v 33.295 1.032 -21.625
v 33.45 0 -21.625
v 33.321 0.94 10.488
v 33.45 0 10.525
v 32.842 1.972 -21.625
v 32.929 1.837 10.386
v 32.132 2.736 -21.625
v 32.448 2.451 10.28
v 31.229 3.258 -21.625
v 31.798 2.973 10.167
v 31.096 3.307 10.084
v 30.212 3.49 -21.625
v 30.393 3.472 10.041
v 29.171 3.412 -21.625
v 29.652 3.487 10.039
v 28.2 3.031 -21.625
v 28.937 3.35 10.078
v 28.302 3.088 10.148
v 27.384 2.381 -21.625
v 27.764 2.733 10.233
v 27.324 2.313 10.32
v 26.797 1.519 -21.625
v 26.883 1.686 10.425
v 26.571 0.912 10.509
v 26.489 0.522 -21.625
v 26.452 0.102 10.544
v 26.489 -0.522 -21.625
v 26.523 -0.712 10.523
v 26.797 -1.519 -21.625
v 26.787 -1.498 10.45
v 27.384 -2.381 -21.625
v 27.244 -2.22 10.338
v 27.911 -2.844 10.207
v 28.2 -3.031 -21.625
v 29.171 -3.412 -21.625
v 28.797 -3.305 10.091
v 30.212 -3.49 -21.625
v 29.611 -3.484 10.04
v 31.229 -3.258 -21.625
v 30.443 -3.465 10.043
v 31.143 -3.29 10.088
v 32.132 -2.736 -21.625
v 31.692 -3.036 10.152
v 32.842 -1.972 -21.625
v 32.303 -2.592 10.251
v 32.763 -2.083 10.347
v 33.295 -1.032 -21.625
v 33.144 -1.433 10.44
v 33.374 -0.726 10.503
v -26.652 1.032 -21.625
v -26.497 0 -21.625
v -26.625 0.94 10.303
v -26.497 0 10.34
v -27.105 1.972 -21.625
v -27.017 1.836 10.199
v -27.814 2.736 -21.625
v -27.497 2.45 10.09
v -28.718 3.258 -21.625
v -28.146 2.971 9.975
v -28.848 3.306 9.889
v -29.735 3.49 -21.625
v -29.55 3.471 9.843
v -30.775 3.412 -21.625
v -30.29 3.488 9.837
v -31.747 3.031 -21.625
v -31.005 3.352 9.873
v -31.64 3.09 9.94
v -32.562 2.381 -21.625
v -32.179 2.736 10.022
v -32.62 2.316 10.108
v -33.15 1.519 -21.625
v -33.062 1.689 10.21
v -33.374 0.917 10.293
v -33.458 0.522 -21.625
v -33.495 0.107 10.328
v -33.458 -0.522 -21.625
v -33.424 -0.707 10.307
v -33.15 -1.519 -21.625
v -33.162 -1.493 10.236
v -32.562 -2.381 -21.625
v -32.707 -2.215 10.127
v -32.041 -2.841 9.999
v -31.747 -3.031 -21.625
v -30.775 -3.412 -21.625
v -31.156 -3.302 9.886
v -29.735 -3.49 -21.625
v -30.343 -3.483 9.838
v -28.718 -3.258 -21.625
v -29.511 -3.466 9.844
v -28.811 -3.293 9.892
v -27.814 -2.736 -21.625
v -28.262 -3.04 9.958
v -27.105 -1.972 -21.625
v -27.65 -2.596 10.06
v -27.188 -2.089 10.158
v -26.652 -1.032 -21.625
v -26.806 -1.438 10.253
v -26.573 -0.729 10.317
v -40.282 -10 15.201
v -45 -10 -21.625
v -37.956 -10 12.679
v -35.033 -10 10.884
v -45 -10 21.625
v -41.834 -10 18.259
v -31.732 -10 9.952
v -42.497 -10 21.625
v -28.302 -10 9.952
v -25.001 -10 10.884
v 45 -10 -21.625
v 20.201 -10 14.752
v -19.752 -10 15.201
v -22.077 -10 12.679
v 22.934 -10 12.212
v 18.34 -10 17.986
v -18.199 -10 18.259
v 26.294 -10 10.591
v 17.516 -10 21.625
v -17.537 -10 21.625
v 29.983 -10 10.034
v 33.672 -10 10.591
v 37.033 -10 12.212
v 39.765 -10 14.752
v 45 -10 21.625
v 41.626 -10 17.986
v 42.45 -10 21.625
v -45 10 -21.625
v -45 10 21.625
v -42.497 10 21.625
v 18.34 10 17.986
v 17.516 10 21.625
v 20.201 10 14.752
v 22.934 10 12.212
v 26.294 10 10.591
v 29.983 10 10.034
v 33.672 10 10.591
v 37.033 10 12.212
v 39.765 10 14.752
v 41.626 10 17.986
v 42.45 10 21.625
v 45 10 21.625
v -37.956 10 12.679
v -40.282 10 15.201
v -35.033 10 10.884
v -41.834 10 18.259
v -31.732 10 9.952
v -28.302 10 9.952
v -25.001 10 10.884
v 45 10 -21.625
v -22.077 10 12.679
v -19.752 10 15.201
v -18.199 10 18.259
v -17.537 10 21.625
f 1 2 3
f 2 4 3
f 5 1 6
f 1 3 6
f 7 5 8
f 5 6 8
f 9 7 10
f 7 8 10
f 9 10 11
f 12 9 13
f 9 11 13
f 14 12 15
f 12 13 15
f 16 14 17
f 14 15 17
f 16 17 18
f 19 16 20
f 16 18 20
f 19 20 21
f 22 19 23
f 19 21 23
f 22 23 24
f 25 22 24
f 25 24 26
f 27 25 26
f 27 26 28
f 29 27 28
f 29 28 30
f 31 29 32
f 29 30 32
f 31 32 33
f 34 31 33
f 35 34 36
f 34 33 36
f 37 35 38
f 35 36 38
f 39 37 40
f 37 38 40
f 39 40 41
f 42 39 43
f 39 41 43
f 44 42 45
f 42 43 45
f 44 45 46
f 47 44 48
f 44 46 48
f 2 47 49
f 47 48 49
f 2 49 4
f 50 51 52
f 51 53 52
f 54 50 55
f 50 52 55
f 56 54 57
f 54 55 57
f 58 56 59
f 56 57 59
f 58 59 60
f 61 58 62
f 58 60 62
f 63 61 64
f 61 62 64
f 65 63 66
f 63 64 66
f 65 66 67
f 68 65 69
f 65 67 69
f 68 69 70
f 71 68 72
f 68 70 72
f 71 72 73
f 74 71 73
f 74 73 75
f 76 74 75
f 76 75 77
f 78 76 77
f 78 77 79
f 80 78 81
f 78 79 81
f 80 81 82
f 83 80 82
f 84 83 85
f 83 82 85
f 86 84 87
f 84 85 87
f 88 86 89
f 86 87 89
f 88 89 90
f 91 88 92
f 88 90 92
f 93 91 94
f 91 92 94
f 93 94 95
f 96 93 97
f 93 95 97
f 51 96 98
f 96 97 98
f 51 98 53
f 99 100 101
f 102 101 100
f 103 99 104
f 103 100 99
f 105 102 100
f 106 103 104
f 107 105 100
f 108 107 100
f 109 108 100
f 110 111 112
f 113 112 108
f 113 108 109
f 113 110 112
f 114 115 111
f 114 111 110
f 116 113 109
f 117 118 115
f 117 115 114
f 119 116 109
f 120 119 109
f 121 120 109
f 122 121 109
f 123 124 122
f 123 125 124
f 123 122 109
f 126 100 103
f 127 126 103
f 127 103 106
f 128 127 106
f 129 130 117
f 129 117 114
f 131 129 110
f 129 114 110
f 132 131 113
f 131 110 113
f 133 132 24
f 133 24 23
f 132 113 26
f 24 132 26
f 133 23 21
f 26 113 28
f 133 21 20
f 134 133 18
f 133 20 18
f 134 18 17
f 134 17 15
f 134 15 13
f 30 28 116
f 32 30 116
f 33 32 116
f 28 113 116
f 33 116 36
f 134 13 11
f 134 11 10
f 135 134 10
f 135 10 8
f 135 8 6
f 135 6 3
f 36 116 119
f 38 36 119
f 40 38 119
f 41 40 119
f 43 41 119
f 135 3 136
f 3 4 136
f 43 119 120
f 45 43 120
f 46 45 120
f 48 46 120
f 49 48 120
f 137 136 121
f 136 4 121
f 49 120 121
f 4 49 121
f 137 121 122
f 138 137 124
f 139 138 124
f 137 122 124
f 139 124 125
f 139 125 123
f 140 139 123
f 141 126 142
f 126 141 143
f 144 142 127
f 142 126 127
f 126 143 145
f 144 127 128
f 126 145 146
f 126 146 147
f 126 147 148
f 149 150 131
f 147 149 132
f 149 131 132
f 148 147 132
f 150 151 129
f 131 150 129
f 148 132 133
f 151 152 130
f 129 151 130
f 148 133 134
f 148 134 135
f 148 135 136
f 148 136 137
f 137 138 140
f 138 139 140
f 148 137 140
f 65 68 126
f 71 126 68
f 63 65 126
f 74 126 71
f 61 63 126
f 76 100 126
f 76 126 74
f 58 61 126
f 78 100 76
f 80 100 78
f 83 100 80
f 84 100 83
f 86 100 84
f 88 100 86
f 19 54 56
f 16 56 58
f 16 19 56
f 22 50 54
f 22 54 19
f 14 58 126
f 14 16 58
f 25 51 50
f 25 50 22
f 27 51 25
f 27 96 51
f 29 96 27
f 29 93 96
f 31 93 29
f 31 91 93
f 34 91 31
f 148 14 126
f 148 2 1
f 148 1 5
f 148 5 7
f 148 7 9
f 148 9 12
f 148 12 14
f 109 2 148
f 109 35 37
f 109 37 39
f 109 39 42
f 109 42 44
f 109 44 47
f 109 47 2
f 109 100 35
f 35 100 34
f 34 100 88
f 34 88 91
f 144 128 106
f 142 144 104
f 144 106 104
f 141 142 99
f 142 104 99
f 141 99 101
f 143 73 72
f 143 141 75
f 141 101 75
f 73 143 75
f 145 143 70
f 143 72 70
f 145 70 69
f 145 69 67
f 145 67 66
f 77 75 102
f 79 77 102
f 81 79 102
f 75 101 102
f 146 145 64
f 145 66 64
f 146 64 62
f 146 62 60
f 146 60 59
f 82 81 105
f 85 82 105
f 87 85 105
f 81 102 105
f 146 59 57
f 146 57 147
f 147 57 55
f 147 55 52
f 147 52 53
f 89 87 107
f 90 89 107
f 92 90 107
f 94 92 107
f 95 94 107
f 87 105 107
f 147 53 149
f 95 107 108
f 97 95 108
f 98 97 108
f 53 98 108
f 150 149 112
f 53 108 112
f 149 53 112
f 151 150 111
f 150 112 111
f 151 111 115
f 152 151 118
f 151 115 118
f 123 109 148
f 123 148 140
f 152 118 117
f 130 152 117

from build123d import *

# Parameters (mm, degrees)
F0_W     = 90
F0_H     = 43.25
F1_DEPTH = 10
F2_R     = 12.5
F3_DEPTH = 15
F4_R     = 3.5
F5_DEPTH = 40


with BuildPart() as f1:
    # F0 (on Front) → F1 (new body, symmetric)
    with BuildSketch(Plane.XZ):
        Rectangle(F0_W, F0_H)
    extrude(amount=F1_DEPTH, both=True)

    # F2 (on Front) → F3 (cut, symmetric)
    with BuildSketch(Plane.XZ):
        with Locations((-30.016759, 22.333868)):
            Circle(F2_R)
        with Locations((29.983241, 22.534277)):
            Circle(F2_R)
    extrude(amount=F3_DEPTH, both=True, mode=Mode.SUBTRACT)

    # F4 (on Top) → F5 (cut, symmetric)
    with BuildSketch(Plane.XY):
        with Locations((-29.996643, 0)):
            Circle(F4_R)
        with Locations((29.950126, 0)):
            Circle(F4_R)
    extrude(amount=F5_DEPTH, both=True, mode=Mode.SUBTRACT)


solid = f1.part
